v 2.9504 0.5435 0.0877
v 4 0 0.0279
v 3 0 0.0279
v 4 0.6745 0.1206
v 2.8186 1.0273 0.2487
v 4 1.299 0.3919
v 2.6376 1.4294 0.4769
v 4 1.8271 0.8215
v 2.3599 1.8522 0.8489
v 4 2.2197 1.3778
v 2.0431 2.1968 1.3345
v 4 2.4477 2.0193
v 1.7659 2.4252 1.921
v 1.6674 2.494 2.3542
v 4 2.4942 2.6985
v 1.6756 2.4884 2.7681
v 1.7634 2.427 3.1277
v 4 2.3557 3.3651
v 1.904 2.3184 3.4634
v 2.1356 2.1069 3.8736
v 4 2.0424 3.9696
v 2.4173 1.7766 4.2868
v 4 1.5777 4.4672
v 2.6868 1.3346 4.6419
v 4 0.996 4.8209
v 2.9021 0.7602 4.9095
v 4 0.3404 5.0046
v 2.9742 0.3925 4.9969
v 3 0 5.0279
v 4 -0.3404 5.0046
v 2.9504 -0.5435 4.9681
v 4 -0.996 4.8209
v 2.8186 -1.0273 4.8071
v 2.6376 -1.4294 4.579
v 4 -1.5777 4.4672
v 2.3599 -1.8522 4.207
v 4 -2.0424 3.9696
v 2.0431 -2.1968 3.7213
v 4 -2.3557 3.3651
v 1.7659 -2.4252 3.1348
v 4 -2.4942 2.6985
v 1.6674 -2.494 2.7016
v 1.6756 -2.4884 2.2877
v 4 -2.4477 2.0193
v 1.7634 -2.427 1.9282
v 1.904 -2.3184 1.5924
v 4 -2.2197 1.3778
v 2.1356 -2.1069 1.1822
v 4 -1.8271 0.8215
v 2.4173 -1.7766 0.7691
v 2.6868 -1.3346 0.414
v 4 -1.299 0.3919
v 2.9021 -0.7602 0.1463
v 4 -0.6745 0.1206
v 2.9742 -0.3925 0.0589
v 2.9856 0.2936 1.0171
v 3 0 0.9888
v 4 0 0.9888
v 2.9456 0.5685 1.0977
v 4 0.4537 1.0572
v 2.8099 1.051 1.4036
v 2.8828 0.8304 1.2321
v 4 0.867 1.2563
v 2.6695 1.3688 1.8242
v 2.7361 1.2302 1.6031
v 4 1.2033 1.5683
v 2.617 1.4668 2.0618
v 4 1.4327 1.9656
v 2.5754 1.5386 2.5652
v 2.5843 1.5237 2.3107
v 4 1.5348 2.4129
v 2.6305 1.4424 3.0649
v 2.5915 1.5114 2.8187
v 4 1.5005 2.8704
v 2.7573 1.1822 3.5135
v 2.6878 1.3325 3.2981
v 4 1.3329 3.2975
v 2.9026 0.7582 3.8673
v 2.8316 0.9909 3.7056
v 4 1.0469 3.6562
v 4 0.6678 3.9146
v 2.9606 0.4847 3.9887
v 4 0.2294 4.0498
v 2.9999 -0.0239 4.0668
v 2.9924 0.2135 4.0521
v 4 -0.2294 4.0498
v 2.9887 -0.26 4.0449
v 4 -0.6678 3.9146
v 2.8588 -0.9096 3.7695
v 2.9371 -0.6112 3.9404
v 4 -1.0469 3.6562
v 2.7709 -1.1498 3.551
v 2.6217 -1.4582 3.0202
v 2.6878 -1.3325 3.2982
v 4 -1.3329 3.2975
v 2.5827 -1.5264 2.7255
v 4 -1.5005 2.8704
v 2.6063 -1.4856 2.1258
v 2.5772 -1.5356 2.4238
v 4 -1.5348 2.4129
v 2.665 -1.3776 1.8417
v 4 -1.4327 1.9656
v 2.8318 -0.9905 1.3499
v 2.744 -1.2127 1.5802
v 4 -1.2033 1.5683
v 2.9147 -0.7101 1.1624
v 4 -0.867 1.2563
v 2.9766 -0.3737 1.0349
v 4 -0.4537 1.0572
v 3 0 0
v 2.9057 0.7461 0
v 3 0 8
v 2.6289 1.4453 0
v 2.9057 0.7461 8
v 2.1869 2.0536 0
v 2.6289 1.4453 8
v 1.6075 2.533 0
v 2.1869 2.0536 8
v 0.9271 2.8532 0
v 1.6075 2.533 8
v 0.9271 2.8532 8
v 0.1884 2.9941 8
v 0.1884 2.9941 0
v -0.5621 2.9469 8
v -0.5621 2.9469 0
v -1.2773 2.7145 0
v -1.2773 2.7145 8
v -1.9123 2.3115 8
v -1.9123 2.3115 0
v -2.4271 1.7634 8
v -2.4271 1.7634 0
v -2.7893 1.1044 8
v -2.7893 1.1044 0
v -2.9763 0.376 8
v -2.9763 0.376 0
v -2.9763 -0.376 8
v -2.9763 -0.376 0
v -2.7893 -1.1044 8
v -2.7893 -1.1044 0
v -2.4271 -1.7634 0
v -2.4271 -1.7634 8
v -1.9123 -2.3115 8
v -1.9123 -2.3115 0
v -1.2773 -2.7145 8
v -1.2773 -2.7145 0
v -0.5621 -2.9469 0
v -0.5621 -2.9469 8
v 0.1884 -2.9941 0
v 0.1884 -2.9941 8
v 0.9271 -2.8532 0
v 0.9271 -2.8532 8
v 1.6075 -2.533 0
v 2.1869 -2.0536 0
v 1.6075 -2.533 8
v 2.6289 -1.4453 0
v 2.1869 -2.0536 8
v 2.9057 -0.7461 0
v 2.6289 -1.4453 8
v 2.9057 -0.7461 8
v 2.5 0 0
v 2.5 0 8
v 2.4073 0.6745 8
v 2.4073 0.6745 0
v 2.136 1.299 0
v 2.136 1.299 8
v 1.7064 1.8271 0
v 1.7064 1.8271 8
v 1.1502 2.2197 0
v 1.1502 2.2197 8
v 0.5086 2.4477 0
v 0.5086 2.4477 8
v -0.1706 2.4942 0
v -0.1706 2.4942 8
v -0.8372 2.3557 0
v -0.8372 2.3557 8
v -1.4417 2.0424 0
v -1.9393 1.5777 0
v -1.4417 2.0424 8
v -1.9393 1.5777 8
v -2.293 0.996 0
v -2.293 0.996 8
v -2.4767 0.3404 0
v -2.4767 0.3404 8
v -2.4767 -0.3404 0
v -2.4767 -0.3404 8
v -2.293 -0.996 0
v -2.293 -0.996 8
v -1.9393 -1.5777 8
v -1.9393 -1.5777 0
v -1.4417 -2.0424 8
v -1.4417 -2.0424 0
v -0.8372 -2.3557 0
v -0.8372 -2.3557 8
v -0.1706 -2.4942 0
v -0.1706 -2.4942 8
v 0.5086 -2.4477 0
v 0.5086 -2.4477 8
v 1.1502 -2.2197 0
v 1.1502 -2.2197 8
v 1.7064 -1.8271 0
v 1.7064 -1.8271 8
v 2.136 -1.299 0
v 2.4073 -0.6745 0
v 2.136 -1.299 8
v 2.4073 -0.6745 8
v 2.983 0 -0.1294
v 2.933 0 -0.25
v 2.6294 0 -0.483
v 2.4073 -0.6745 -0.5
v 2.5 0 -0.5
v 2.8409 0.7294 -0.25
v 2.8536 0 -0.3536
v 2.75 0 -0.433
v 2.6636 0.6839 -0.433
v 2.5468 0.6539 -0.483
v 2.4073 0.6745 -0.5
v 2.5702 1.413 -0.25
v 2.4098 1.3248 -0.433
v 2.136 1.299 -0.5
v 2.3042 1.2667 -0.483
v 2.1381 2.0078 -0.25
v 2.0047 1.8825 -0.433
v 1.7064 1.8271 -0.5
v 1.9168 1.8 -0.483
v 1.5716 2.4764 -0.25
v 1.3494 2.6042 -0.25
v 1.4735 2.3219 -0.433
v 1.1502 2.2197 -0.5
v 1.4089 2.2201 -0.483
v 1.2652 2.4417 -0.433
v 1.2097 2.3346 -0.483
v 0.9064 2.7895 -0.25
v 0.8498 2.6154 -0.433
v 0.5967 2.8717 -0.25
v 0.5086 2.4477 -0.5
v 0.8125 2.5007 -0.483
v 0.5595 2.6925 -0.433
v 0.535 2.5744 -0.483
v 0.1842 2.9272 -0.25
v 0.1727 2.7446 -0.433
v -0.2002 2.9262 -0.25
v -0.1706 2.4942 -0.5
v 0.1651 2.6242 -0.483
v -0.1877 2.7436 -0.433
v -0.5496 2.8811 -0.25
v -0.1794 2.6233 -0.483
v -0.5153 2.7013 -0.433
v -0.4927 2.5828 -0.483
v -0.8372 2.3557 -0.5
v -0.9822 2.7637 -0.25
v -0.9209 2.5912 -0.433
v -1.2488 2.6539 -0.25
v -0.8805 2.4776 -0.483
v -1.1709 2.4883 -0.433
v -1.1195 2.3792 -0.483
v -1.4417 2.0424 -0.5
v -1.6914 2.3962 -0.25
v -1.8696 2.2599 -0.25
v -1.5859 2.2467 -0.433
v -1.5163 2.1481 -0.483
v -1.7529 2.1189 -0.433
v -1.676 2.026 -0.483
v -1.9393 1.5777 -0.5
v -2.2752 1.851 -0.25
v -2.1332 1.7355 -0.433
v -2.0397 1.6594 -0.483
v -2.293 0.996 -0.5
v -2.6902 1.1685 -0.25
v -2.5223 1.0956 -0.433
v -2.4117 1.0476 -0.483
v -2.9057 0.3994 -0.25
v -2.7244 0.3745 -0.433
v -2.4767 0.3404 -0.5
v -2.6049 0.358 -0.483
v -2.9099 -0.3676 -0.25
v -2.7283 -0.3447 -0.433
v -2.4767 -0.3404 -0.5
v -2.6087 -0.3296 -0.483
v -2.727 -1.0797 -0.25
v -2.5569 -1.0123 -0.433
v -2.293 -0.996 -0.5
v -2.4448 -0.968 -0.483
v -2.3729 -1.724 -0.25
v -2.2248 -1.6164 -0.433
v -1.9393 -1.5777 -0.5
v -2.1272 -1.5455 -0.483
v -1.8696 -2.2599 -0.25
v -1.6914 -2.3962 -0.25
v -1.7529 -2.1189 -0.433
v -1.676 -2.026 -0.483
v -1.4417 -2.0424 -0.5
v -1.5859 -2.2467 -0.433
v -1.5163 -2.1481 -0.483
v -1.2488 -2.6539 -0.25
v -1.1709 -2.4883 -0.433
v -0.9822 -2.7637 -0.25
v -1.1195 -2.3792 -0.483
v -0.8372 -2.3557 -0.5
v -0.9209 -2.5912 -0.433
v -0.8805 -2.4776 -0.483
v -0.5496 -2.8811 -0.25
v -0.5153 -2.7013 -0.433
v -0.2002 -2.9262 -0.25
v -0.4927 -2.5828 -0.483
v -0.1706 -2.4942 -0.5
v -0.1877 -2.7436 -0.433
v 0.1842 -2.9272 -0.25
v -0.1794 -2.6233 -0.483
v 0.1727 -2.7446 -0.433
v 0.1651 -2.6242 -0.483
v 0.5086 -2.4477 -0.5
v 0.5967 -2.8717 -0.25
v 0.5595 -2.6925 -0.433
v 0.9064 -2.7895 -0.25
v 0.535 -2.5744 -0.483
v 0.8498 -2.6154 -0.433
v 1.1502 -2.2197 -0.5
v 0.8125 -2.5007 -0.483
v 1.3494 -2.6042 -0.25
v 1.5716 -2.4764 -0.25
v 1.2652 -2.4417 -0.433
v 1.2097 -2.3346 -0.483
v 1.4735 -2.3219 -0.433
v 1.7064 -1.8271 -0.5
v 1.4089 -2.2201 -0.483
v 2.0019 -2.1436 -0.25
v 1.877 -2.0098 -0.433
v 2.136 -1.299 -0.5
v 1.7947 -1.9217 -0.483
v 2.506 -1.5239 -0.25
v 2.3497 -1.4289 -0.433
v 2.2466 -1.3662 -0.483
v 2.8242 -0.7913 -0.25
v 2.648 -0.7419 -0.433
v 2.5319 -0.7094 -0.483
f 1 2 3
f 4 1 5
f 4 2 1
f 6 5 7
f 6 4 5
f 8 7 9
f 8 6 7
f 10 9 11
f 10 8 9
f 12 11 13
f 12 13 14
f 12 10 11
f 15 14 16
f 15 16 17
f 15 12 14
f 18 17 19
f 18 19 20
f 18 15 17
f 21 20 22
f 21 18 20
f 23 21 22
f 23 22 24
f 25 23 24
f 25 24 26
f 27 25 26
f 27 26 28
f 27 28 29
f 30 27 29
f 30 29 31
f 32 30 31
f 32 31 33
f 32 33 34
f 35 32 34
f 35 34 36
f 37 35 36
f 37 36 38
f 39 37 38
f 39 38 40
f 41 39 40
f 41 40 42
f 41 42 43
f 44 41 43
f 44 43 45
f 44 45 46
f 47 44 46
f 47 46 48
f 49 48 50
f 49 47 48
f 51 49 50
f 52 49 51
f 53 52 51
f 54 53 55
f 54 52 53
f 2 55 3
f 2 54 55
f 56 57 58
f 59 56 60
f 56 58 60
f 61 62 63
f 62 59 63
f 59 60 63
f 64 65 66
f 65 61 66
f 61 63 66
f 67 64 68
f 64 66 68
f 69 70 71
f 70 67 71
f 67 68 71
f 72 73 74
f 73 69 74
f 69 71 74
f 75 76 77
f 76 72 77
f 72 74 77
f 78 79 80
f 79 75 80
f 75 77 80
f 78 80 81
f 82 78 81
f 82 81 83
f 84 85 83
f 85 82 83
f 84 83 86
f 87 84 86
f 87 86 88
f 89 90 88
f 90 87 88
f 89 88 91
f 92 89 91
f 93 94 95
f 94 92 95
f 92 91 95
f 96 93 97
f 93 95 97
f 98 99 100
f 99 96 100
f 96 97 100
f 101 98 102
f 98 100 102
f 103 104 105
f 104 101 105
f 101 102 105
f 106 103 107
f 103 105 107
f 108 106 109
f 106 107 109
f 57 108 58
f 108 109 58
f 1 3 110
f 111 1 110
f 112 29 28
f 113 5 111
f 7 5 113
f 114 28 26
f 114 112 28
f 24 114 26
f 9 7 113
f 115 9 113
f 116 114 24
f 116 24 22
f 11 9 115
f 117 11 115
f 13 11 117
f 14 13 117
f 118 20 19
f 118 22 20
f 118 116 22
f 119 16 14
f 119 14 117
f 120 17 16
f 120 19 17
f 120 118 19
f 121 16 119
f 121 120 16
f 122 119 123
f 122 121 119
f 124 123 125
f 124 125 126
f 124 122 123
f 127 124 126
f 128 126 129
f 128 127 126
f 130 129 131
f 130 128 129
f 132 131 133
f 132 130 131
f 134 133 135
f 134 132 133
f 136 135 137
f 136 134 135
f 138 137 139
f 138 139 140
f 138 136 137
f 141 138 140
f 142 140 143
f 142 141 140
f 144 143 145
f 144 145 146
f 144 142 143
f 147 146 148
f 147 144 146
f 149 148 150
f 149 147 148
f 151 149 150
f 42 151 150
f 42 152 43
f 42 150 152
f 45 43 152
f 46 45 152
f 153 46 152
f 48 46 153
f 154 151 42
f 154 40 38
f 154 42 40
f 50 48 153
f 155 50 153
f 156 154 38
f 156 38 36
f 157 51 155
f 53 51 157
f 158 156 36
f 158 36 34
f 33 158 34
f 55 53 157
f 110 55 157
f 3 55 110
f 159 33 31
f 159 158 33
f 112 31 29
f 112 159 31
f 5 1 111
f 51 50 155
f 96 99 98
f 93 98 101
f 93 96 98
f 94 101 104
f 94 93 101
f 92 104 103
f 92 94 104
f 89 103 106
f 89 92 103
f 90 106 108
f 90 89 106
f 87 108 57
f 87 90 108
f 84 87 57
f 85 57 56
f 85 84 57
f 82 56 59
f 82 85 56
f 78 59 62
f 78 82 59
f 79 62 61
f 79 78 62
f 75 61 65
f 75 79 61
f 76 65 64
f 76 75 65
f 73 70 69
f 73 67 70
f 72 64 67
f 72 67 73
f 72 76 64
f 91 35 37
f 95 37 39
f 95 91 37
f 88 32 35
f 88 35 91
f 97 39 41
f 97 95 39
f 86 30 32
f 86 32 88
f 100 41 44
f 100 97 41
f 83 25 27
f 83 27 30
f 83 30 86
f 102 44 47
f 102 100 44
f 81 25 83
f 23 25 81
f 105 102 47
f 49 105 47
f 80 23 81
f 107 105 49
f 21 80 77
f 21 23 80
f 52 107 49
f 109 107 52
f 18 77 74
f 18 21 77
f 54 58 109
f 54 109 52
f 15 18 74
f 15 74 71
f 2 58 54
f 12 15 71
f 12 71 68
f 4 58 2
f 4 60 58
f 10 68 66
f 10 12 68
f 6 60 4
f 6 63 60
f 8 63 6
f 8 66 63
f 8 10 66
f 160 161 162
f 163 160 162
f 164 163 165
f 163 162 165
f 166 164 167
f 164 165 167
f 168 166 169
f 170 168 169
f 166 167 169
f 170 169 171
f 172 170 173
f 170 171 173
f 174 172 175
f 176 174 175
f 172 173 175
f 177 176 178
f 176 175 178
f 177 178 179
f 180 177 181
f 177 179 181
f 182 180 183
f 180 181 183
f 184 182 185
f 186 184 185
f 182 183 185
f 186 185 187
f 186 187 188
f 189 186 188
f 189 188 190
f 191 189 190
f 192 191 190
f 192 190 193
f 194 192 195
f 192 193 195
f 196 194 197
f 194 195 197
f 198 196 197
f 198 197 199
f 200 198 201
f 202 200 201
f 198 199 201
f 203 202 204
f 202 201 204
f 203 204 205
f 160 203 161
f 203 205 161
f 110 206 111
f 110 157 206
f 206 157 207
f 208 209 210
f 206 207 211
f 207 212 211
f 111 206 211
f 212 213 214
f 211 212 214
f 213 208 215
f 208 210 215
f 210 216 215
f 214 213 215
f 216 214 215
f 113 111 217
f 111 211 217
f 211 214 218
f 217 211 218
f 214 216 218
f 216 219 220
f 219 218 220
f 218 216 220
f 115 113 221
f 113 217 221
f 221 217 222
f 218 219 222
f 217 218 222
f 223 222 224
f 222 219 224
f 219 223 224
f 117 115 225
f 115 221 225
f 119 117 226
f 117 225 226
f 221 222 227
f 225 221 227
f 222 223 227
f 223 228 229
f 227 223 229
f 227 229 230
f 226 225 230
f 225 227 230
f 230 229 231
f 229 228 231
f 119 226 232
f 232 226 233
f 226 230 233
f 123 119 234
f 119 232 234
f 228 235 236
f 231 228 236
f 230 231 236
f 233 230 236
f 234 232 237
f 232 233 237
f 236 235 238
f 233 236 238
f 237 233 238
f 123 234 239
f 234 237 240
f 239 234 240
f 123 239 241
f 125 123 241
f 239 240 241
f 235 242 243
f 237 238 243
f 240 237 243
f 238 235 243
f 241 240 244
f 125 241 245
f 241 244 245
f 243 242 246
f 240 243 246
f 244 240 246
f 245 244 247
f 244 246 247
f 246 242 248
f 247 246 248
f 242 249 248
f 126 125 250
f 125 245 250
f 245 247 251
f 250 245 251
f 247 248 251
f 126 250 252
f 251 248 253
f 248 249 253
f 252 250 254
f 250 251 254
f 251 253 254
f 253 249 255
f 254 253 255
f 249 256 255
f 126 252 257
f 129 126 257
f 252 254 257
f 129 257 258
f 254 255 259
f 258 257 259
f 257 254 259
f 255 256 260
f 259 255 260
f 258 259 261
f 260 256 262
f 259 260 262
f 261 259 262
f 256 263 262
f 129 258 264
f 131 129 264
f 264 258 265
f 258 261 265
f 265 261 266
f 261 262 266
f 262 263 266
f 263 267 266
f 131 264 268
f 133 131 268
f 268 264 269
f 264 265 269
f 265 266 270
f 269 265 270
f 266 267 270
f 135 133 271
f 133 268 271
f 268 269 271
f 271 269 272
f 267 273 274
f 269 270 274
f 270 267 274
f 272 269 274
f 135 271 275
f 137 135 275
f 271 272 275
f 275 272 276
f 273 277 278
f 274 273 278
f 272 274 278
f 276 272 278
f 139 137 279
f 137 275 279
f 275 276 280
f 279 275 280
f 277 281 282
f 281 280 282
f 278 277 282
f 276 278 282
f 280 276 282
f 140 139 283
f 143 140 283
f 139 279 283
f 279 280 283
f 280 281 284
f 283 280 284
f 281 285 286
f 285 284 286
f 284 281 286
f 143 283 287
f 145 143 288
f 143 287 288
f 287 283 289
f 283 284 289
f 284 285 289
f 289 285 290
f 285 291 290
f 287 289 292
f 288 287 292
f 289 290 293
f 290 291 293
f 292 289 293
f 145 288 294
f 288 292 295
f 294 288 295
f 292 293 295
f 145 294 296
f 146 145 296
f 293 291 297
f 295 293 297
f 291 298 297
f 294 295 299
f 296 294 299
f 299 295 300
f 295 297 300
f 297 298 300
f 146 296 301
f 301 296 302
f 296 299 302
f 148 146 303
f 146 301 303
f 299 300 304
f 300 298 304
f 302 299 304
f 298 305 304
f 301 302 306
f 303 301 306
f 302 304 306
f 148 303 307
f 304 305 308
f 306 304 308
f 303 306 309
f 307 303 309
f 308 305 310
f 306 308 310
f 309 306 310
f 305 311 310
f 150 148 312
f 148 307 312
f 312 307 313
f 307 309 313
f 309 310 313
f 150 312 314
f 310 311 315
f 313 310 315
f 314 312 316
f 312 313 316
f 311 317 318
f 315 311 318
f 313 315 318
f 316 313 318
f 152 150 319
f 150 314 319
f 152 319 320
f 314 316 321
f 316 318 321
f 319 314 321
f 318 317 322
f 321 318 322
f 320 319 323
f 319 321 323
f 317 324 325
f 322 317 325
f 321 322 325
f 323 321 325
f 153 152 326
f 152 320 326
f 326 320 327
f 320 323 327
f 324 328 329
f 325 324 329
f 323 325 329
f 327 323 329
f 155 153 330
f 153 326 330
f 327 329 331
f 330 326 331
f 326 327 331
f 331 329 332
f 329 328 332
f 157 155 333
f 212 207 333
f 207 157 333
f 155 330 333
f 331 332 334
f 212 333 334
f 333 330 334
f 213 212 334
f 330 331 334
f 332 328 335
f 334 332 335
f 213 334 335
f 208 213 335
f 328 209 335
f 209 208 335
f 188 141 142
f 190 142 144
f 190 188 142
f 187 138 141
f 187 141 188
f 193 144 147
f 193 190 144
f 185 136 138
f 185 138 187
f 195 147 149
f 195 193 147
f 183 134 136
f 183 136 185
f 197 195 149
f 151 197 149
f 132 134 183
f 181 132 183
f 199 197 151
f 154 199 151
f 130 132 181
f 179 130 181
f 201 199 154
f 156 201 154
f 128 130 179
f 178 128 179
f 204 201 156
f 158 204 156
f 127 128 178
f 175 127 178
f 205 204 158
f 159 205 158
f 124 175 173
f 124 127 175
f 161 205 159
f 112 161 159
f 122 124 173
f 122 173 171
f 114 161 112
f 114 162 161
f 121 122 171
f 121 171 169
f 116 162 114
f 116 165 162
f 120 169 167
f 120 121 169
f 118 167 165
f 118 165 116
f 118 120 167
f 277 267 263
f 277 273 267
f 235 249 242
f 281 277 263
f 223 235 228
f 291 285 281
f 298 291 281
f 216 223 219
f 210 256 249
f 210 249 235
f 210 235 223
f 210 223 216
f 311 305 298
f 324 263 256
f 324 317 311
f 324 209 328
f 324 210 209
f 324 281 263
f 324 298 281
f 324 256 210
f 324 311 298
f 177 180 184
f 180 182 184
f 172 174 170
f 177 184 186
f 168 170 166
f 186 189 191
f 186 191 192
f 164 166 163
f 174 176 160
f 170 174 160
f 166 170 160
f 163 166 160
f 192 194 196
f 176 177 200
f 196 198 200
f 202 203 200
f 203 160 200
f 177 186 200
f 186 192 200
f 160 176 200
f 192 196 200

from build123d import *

# Parameters (mm, degrees)
SKETCH2_R                = 3
SKETCH2_R_2              = 2.5
BOSS_EXTRUDE1_DEPTH      = 8
BOSS_EXTRUDE6_REACH      = 11.394
BOSS_EXTRUDE6_END_RADIUS = 3
SKETCH7_R                = 2.5
SKETCH7_R_2              = 1.539100033
SKETCH8_R                = 3
BOSS_EXTRUDE7_DEPTH      = 0.5


with BuildPart() as part:
    # Sketch2 → Boss-Extrude1 (new body)
    with BuildSketch(Plane.XY.offset(8)):
        Circle(SKETCH2_R)
        Circle(SKETCH2_R_2, mode=Mode.SUBTRACT)
    extrude(amount=-BOSS_EXTRUDE1_DEPTH)

    # Boss-Extrude6: up to this cylinder (the profile starts outside it)
    boss_extrude6_end = Plane(origin=(0, 0, 4.957209), z_dir=(0, 0, 1)) * Cylinder(BOSS_EXTRUDE6_END_RADIUS, 29.788, mode=Mode.PRIVATE)
    # Sketch7 → Boss-Extrude6 (add, up to the surface)
    with BuildSketch(Plane(origin=(4, 0, 2.500950228), x_dir=(0, 0, -1), z_dir=(1, 0, 0)), mode=Mode.PRIVATE) as boss_extrude6_sk1:
        with Locations((-0.026969657, 0)):
            Circle(SKETCH7_R)
        with Locations((-0.026969657, 0)):
            Circle(SKETCH7_R_2, mode=Mode.SUBTRACT)
    boss_extrude6_tool1 = extrude(boss_extrude6_sk1.sketch, amount=-BOSS_EXTRUDE6_REACH, mode=Mode.PRIVATE) - boss_extrude6_end
    add(boss_extrude6_tool1.solids().sort_by_distance((4, 0, 4.957209))[0])

    # Sketch8 → Boss-Extrude7 (add)
    with BuildSketch(Plane(origin=(0, 0, 0), x_dir=(-1, 0, 0), z_dir=(0, 0, -1))):
        with Locations(Location((0, 0, 0), (0, 0, 180))):
            Circle(SKETCH8_R)
    extrude(amount=BOSS_EXTRUDE7_DEPTH)

    # Fillet2: read off the stored shape, not the designer's step
    # Fillet2 outline → Fillet2 (revolve, cut)
    with BuildSketch(Plane.XZ):
        with BuildLine():
            Line((3, -0.5), (3, 0))
            ThreePointArc((3, 0), (2.853553391, -0.353553391), (2.5, -0.5))
            Line((2.5, -0.5), (3, -0.5))
        make_face()
    revolve(axis=Axis((0, 0, 0), (0, 0, 1)), mode=Mode.SUBTRACT)


solid = part.part
